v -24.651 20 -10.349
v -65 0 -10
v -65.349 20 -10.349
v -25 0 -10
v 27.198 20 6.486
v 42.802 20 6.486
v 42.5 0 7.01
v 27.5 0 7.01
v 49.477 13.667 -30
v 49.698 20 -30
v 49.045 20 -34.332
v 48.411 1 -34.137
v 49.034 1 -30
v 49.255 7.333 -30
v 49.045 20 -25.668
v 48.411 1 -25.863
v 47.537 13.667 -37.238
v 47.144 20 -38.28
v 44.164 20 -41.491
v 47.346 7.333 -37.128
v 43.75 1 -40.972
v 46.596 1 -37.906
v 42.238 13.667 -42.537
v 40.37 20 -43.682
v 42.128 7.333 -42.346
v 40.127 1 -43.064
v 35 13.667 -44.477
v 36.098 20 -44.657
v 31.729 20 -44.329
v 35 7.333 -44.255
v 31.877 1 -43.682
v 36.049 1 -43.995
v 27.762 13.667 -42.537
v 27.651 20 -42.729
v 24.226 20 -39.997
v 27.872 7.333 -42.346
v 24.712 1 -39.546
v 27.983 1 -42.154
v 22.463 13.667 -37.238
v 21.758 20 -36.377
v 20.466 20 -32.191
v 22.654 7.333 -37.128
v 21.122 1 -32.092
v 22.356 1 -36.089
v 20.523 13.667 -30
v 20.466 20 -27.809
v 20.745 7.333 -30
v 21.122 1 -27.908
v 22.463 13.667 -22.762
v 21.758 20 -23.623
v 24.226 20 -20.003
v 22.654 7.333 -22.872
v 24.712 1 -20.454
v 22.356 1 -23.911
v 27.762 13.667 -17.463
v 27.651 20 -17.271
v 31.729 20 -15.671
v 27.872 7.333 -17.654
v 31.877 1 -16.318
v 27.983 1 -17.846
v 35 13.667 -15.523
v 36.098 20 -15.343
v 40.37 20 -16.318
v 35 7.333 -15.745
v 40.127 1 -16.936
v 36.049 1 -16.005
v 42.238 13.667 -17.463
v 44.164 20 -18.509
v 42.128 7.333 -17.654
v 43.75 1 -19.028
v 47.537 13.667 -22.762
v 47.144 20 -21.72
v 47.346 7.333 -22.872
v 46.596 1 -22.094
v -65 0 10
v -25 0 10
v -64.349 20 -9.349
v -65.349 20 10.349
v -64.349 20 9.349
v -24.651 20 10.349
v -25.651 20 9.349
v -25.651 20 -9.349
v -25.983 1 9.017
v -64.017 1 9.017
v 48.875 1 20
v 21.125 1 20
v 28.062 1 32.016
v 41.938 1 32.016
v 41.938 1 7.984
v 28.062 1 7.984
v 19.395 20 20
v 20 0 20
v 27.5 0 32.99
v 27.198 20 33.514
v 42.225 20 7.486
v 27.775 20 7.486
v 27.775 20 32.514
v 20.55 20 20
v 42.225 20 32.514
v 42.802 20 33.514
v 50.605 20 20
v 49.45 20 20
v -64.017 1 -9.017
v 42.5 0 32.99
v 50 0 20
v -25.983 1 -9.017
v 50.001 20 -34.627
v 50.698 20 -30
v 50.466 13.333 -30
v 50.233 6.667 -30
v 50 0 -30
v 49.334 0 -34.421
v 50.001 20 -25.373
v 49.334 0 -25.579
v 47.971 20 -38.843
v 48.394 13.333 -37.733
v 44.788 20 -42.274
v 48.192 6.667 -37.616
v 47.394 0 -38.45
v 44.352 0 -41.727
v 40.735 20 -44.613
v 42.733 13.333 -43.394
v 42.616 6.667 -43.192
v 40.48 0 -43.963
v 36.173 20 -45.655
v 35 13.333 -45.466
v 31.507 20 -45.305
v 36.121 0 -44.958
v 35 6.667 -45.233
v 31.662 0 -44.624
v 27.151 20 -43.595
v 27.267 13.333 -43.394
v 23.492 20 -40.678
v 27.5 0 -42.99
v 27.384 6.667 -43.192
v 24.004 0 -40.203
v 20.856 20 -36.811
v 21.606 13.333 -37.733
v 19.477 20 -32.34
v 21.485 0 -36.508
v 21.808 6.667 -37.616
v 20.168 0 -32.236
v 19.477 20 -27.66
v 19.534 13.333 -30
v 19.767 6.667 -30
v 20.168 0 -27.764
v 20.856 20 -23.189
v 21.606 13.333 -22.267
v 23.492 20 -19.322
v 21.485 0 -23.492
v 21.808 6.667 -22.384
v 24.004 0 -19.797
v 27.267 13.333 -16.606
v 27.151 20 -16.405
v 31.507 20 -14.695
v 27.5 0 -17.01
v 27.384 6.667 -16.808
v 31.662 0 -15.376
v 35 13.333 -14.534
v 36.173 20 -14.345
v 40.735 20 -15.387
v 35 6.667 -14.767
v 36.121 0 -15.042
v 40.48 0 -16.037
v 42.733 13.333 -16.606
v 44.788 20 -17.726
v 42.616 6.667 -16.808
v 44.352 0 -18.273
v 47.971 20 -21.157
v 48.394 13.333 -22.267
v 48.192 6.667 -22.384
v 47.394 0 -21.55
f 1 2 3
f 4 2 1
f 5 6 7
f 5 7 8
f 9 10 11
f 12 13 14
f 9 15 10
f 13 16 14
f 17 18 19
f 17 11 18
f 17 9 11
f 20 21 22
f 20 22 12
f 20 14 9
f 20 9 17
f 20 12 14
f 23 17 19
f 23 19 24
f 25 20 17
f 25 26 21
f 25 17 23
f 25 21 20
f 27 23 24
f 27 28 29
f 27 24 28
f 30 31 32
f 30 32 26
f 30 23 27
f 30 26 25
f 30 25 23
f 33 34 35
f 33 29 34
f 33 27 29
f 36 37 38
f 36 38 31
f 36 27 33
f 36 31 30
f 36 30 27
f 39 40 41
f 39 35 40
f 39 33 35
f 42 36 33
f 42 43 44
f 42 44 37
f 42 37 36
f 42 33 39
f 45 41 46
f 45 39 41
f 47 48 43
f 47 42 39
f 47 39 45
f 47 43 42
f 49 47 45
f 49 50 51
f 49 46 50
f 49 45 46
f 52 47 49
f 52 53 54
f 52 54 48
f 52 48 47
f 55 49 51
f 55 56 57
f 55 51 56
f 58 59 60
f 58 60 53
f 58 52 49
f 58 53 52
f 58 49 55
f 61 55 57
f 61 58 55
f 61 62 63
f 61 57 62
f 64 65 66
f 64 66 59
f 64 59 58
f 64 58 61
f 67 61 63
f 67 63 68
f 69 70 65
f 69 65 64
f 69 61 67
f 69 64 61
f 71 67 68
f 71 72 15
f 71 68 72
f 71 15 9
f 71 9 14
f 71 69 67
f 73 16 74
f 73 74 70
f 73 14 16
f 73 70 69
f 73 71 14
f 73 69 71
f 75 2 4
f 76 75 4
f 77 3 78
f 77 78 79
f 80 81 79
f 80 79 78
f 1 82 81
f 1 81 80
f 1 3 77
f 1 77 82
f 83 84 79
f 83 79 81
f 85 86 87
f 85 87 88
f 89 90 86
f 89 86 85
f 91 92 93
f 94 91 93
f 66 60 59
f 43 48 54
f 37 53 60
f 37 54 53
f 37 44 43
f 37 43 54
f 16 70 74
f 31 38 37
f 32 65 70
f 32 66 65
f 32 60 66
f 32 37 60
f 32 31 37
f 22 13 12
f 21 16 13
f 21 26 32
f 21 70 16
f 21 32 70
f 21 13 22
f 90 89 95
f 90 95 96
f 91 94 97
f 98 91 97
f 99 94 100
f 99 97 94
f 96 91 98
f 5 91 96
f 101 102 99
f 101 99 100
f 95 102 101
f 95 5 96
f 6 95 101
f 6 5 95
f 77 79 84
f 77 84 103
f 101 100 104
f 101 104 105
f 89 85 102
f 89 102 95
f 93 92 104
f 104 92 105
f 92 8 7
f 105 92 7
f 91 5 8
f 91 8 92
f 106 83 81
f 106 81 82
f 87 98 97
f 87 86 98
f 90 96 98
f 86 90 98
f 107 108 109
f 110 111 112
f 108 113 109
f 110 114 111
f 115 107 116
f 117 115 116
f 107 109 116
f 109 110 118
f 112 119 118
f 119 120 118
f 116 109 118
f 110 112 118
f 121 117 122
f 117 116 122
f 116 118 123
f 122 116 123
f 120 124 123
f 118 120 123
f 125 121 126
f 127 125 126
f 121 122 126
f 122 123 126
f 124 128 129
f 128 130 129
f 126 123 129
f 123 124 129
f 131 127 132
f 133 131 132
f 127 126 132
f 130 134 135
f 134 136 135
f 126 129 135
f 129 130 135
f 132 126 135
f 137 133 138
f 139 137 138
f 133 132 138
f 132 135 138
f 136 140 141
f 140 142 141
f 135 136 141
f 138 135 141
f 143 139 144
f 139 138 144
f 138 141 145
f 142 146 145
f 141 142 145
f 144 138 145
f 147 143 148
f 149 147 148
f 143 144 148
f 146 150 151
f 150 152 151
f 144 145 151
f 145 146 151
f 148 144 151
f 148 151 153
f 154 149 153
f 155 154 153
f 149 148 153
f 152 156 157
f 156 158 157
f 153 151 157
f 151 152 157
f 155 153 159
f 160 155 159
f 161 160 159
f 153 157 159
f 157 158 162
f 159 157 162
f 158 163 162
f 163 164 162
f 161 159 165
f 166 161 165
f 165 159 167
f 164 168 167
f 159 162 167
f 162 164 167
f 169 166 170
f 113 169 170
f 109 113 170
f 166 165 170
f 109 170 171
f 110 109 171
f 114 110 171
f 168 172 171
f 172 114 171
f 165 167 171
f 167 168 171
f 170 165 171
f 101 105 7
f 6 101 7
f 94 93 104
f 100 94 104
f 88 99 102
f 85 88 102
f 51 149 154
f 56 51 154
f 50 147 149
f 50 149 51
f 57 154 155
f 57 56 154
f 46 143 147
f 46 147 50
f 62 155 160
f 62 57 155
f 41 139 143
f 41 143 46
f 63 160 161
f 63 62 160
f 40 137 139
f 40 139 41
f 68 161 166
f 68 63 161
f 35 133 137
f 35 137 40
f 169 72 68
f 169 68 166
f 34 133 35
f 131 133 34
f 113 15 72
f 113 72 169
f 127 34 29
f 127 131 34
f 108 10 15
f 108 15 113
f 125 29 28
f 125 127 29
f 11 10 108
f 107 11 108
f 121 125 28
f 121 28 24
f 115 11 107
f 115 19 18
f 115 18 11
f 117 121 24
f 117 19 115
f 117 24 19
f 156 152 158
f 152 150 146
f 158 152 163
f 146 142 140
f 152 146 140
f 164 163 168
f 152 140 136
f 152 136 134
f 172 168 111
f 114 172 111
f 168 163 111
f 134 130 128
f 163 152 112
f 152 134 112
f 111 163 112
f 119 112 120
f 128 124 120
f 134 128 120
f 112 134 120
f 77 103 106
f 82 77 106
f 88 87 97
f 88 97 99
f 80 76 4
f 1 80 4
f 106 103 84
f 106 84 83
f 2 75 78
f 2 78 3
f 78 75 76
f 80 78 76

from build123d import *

# Parameters (mm, degrees)
CROQUIS1_W              = 40
CROQUIS1_H              = 20
SALIENTE_EXTRUIR1_DEPTH = 20
SALIENTE_EXTRUIR1_DRAFT = -1
CROQUIS1_3_R            = 15
SALIENTE_EXTRUIR2_DEPTH = 20
SALIENTE_EXTRUIR2_DRAFT = -2
SALIENTE_EXTRUIR3_DEPTH = 20
SALIENTE_EXTRUIR3_DRAFT = -1.5
VACIADO1_T              = -1
VACIADO2_T              = -1
VACIADO3_T              = -1


with BuildPart() as part:
    # Croquis1 → Saliente-Extruir1 (with draft: the straight prism first)
    with BuildSketch(Plane(origin=(0, 0, 0), x_dir=(1, 0, 0), z_dir=(0, 1, 0))):
        with Locations((-45, 0)):
            Rectangle(CROQUIS1_W, CROQUIS1_H)
    extrude(amount=SALIENTE_EXTRUIR1_DEPTH)
    # Saliente-Extruir1: the draft: its side faces are tilted about the plane it starts from
    saliente_extruir1_sides = [part.faces().sort_by_distance(p)[0] for p in [
        (-65, 10, 0),
        (-45, 10, 10),
        (-25, 10, 0),
        (-45, 10, -10),
    ]]
    draft(saliente_extruir1_sides, Plane(origin=(0, 0, 0), x_dir=(1, 0, 0), z_dir=(0, 1, 0)), SALIENTE_EXTRUIR1_DRAFT)

    # Vaciado1
    vaciado1_openings = [part.faces().sort_by_distance(p)[0] for p in [
        (-45, 20, 0),
    ]]
    offset(amount=VACIADO1_T, openings=vaciado1_openings, kind=Kind.INTERSECTION)


with BuildPart() as body_2:
    # Croquis1<3> → Saliente-Extruir2 (with draft: the straight prism first)
    with BuildSketch(Plane(origin=(0, 0, 0), x_dir=(1, 0, 0), z_dir=(0, 1, 0))):
        with Locations((35, 30)):
            Circle(CROQUIS1_3_R)
    extrude(amount=SALIENTE_EXTRUIR2_DEPTH)
    # Saliente-Extruir2: the draft: its side faces are tilted about the plane it starts from
    saliente_extruir2_sides = [body_2.faces().sort_by_distance(p)[0] for p in [
        (20, 10, -30),
    ]]
    draft(saliente_extruir2_sides, Plane(origin=(0, 0, 0), x_dir=(1, 0, 0), z_dir=(0, 1, 0)), SALIENTE_EXTRUIR2_DRAFT)

    # Vaciado3
    vaciado3_openings = [body_2.faces().sort_by_distance(p)[0] for p in [
        (35, 20, -30),
    ]]
    offset(amount=VACIADO3_T, openings=vaciado3_openings, kind=Kind.INTERSECTION)


with BuildPart() as body_3:
    # Croquis1<4> → Saliente-Extruir3 (with draft: the straight prism first)
    with BuildSketch(Plane(origin=(0, 0, 0), x_dir=(1, 0, 0), z_dir=(0, 1, 0))):
        Polygon((42.5, -32.990381057), (50, -20), (42.5, -7.009618943), (27.5, -7.009618943), (20, -20), (27.5, -32.990381057), align=None)
    extrude(amount=SALIENTE_EXTRUIR3_DEPTH)
    # Saliente-Extruir3: the draft: its side faces are tilted about the plane it starts from
    saliente_extruir3_sides = [body_3.faces().sort_by_distance(p)[0] for p in [
        (46.25, 10, 26.495190528),
        (46.25, 10, 13.504809472),
        (35, 10, 7.009618943),
        (23.75, 10, 13.504809472),
        (23.75, 10, 26.495190528),
        (35, 10, 32.990381057),
    ]]
    draft(saliente_extruir3_sides, Plane(origin=(0, 0, 0), x_dir=(1, 0, 0), z_dir=(0, 1, 0)), SALIENTE_EXTRUIR3_DRAFT)

    # Vaciado2
    vaciado2_openings = [body_3.faces().sort_by_distance(p)[0] for p in [
        (35, 20, 20),
    ]]
    offset(amount=VACIADO2_T, openings=vaciado2_openings, kind=Kind.INTERSECTION)


solid = Compound([part.part, body_2.part, body_3.part])
